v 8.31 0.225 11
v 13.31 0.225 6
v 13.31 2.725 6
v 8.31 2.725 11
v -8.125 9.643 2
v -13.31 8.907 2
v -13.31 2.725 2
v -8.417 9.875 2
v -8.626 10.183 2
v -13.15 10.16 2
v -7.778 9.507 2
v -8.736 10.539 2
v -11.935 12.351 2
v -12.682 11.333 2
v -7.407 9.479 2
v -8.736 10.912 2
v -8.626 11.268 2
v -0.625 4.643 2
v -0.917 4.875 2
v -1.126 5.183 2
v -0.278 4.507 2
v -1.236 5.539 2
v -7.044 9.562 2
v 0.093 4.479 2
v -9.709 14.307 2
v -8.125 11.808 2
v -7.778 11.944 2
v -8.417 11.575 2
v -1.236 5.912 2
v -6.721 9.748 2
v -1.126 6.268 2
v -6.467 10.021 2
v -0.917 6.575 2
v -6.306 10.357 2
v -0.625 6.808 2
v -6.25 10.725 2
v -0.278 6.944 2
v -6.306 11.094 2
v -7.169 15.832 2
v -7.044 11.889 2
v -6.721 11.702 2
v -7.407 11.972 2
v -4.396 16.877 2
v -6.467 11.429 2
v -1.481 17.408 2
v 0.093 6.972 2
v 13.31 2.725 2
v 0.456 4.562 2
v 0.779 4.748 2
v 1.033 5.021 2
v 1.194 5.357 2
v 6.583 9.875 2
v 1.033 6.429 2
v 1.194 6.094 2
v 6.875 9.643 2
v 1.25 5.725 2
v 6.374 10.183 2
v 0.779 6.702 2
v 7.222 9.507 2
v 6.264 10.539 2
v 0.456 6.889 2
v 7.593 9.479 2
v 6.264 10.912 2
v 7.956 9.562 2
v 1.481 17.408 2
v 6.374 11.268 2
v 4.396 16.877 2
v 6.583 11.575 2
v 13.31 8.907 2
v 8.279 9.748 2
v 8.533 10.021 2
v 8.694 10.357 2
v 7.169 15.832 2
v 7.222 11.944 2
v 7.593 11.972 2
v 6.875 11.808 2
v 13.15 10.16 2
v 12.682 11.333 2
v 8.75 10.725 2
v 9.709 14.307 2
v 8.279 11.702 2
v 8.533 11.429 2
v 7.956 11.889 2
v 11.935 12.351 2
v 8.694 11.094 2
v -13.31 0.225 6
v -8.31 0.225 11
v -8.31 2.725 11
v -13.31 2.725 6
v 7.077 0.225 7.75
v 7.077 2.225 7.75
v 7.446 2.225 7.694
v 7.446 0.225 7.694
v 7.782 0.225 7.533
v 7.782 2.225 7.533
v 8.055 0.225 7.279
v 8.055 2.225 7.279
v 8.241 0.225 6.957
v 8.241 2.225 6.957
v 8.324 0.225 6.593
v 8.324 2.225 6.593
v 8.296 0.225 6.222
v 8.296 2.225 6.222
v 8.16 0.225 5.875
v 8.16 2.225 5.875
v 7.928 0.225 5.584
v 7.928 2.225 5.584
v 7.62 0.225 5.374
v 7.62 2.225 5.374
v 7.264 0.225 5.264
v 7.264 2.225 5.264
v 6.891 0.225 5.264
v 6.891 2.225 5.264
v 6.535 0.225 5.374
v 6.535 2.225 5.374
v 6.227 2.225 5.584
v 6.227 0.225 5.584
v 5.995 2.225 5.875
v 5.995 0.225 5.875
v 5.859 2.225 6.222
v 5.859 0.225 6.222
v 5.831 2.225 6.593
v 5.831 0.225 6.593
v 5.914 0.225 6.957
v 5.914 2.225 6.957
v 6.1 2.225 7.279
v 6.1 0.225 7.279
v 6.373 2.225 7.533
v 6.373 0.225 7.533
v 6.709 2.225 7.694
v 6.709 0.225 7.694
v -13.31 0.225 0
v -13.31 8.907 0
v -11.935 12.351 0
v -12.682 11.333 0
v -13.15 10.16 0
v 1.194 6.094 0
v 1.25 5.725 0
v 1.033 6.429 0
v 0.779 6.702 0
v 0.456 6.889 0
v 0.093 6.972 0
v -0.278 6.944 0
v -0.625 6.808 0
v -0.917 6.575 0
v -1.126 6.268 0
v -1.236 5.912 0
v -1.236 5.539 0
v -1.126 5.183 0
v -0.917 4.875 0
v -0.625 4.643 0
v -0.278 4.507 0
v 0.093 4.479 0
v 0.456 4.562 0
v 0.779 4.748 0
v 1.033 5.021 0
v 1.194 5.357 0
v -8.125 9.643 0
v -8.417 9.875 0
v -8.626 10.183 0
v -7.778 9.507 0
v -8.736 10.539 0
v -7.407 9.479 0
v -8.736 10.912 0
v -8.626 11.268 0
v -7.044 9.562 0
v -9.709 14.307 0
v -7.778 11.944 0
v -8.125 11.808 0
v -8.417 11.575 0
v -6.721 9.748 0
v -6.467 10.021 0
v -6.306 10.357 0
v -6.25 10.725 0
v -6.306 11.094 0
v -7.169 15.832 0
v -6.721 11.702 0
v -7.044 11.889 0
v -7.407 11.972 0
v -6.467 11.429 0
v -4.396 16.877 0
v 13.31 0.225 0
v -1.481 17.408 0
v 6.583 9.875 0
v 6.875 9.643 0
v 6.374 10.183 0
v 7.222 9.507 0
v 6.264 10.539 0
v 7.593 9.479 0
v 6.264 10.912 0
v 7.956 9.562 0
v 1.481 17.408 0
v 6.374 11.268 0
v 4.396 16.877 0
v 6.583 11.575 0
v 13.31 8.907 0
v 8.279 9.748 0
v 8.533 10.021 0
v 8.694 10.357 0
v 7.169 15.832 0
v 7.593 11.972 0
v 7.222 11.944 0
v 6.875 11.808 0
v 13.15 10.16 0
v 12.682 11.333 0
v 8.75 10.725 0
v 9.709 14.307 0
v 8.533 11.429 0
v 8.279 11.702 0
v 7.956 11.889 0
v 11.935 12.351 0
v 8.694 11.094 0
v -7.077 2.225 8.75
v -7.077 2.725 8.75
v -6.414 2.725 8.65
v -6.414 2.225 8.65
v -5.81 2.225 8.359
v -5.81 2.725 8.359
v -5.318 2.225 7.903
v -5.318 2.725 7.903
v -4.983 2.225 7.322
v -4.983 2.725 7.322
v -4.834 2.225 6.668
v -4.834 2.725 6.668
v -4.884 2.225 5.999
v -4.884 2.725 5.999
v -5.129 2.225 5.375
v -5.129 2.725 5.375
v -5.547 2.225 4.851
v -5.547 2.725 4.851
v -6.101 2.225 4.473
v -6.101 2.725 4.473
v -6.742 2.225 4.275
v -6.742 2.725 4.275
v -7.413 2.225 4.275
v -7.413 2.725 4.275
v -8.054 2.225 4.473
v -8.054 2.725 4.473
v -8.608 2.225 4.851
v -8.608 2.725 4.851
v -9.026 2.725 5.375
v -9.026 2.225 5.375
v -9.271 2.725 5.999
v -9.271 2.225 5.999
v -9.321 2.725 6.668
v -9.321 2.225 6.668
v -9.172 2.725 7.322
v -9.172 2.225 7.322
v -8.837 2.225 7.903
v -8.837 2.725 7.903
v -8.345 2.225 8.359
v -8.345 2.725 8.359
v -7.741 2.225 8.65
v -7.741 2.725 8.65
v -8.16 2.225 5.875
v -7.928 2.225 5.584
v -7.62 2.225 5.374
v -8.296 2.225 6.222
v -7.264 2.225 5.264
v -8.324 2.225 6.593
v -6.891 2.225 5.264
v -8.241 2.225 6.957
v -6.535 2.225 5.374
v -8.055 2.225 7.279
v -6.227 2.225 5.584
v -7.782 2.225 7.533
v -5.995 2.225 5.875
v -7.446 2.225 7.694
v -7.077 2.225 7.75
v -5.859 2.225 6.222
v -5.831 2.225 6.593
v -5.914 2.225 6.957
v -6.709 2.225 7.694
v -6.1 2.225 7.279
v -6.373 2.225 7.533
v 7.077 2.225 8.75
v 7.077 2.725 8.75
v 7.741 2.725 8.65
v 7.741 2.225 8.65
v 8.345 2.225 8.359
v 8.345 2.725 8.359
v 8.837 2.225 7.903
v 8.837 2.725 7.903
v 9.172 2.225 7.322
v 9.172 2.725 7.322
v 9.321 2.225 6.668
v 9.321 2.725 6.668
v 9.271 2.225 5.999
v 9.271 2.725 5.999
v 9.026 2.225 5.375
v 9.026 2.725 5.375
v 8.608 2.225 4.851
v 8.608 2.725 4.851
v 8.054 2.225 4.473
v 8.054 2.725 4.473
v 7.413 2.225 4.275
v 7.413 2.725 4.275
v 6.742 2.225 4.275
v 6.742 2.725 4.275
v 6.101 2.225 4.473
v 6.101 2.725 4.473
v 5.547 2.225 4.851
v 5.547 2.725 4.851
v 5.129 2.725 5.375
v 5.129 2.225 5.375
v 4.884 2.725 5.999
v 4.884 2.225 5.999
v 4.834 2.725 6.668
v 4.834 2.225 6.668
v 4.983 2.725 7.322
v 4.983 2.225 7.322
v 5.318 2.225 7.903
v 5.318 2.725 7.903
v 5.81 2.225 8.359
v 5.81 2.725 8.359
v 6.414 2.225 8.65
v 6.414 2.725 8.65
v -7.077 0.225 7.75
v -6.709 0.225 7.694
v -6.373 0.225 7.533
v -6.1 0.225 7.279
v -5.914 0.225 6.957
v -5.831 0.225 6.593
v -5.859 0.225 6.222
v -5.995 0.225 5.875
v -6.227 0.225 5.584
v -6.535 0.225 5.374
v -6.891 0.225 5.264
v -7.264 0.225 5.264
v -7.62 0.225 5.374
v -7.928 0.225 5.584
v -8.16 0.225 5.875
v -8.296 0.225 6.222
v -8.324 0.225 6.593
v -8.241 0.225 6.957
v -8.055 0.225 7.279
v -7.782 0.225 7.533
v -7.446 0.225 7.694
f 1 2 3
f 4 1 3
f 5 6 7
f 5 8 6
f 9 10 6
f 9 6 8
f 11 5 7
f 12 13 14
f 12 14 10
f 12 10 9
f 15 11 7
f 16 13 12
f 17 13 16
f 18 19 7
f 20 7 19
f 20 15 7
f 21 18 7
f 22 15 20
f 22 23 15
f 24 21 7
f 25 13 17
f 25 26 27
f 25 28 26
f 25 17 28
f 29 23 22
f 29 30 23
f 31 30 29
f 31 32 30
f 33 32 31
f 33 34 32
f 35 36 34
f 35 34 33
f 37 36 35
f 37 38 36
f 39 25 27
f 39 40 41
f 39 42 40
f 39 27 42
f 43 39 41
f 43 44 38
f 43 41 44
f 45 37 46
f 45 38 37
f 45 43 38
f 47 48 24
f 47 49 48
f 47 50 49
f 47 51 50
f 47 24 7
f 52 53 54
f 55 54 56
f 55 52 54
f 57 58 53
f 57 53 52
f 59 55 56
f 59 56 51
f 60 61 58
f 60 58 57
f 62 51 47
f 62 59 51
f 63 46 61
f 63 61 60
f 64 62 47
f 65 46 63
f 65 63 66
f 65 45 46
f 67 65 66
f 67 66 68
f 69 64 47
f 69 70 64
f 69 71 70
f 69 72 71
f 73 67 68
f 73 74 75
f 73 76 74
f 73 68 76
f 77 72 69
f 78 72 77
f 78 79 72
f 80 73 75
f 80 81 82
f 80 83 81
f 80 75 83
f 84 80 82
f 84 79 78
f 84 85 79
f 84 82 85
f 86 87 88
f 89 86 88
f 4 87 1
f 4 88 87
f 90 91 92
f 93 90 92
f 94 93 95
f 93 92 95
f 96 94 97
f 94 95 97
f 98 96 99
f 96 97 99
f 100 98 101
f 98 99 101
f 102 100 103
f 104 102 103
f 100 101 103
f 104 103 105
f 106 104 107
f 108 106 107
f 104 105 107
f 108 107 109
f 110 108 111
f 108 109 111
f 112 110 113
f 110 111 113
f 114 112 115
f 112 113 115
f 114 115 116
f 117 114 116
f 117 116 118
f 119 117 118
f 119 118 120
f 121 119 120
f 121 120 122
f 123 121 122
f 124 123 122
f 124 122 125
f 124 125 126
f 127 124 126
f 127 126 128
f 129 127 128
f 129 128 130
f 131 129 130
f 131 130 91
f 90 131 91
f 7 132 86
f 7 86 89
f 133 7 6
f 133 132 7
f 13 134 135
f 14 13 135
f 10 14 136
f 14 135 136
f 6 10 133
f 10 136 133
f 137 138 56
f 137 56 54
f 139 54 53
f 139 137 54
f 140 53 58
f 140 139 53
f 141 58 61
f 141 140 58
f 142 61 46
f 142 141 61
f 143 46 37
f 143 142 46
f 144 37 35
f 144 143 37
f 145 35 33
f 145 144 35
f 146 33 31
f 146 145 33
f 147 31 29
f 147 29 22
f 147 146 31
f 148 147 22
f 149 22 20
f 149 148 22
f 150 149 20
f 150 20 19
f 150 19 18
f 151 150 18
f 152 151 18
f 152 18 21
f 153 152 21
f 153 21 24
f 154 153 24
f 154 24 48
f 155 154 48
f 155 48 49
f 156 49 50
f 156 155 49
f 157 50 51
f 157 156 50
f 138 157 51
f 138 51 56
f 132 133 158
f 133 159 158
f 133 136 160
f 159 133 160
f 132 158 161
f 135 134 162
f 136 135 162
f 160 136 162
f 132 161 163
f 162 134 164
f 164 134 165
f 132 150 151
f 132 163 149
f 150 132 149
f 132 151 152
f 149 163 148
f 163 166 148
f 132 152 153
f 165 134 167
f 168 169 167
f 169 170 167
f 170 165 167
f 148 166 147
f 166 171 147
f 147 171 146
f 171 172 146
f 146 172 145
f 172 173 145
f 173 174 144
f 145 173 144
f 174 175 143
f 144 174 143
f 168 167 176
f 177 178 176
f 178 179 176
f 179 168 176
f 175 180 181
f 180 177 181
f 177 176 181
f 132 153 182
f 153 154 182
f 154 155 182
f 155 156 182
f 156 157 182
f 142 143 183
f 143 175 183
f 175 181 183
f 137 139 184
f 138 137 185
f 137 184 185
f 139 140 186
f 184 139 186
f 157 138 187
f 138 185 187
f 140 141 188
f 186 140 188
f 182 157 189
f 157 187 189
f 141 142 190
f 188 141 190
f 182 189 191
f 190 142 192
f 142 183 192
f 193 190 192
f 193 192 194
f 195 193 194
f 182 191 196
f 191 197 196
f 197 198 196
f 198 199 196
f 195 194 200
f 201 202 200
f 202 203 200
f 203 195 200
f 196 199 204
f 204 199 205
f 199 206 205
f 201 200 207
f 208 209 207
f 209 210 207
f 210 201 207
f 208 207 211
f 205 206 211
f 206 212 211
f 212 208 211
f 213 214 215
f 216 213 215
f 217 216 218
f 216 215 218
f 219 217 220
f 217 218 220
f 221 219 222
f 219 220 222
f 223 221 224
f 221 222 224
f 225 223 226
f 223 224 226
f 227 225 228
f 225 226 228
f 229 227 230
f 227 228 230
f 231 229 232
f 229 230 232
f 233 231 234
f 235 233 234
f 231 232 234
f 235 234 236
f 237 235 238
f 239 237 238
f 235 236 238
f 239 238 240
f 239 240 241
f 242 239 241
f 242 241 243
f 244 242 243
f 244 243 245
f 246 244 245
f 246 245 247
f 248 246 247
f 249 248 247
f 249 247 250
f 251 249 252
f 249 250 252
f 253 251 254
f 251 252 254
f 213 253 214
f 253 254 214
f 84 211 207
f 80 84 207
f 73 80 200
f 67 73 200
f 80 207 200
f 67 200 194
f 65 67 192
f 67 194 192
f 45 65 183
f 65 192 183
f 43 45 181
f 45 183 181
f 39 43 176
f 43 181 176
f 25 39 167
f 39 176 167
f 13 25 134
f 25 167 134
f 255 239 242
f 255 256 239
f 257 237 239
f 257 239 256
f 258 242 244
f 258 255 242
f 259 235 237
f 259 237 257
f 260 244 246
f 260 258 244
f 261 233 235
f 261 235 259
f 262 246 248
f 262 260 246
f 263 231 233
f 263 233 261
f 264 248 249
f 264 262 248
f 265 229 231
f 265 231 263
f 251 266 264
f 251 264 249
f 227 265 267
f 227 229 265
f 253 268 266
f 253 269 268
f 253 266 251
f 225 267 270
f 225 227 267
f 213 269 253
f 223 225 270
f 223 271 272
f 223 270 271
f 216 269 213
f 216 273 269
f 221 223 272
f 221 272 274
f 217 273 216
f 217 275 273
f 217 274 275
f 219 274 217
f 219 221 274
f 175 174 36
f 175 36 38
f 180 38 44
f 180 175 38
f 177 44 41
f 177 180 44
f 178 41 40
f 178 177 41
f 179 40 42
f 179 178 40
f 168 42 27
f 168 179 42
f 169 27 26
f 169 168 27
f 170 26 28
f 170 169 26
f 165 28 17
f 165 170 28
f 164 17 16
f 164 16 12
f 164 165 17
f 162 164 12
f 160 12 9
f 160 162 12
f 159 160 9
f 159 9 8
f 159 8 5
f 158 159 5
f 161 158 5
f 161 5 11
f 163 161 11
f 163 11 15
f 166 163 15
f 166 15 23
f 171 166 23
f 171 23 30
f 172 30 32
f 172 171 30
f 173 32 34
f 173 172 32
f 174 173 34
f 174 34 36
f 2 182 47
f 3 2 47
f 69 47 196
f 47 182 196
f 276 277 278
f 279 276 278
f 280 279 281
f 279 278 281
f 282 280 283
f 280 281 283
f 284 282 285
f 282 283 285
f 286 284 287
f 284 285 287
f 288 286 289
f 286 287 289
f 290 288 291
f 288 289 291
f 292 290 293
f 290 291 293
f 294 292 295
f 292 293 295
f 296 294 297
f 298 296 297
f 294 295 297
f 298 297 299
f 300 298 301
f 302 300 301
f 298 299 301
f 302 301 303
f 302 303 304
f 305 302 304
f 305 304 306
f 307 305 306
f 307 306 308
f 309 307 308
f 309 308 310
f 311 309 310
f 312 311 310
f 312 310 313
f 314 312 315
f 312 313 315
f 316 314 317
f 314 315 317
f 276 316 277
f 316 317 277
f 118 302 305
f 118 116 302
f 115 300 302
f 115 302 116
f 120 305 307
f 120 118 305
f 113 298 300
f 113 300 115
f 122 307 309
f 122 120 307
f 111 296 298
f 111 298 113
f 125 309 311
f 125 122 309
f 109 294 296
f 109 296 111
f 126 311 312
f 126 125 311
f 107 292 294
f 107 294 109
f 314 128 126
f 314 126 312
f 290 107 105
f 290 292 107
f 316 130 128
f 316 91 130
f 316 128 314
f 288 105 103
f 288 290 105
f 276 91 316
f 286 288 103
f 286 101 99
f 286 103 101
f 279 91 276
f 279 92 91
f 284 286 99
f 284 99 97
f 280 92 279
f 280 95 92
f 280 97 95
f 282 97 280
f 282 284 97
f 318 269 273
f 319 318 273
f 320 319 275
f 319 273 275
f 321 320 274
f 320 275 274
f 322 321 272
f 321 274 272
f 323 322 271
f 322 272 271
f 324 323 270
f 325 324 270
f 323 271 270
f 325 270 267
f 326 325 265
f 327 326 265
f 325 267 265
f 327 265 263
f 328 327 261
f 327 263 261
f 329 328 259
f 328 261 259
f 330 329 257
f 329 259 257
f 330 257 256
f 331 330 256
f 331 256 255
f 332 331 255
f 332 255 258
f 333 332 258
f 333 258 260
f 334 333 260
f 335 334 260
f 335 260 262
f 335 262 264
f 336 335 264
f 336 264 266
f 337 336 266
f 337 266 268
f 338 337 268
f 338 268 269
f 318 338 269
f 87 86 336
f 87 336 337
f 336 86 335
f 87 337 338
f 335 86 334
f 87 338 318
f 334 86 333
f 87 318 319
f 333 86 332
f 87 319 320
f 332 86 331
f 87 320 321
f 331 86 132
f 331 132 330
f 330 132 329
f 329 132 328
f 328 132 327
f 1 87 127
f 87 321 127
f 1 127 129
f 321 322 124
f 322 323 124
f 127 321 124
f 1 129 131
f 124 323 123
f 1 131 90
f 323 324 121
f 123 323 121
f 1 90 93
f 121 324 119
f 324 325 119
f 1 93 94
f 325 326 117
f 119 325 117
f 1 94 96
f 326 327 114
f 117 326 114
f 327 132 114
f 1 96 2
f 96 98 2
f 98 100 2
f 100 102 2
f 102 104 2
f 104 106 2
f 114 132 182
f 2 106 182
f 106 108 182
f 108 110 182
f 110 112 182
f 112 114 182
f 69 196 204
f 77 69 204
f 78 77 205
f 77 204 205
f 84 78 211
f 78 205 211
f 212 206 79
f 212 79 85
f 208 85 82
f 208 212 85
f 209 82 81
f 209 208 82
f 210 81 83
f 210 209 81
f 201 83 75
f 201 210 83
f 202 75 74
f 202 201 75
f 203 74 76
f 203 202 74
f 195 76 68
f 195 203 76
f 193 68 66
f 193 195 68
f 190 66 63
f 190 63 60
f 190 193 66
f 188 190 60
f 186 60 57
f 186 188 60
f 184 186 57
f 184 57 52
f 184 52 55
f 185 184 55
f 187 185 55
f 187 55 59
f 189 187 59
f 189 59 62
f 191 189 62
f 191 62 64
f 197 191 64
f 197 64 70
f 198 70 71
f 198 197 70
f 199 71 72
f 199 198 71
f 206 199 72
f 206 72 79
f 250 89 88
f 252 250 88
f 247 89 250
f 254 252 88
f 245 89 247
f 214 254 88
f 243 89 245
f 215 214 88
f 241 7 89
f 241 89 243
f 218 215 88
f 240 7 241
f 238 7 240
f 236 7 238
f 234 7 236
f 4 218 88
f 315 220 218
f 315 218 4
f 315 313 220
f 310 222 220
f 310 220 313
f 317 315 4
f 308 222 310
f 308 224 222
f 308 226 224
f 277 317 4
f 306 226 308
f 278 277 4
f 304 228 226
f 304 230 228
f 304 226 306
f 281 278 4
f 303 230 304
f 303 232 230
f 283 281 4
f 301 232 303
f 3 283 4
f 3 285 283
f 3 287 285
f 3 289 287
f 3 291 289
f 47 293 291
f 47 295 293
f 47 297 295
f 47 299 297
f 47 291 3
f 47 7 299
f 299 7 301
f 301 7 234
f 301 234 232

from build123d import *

# Parameters (mm, degrees)
SKETCH1_R           = 1.25
BOSS_EXTRUDE1_DEPTH = 2
SKETCH2_W           = 26.619471542
SKETCH2_H           = 2.5
BOSS_EXTRUDE2_DEPTH = 9
SKETCH3_R           = 1.25
CUT_EXTRUDE1_DEPTH  = 9
SKETCH4_R           = 2.25
CUT_EXTRUDE2_DEPTH  = 0.5
CHAMFER1_SIZE       = 5


with BuildPart() as part:
    # Sketch1 → Boss-Extrude1 (new body)
    with BuildSketch(Plane.XY):
        with BuildLine():
            Line((-13.309735771, 0.225207445), (13.309735771, 0.225207445))
            Line((13.309735771, 0.225207445), (13.309735771, 8.907396156))
            ThreePointArc((13.309735771, 8.907396156), (12.953344247, 10.761284051), (11.934975641, 12.350887972))
            ThreePointArc((11.934975641, 12.350887972), (0, 17.475207445), (-11.934975641, 12.350887972))
            ThreePointArc((-11.934975641, 12.350887972), (-12.953344247, 10.761284051), (-13.309735771, 8.907396156))
            Line((-13.309735771, 8.907396156), (-13.309735771, 0.225207445))
        make_face()
        with Locations((7.499735771, 10.725207445)):
            Circle(SKETCH1_R, mode=Mode.SUBTRACT)
        with Locations((-7.500264229, 10.725207445)):
            Circle(SKETCH1_R, mode=Mode.SUBTRACT)
        with Locations((-0.000264229, 5.725207445)):
            Circle(SKETCH1_R, mode=Mode.SUBTRACT)
    extrude(amount=BOSS_EXTRUDE1_DEPTH)

    # Sketch2 → Boss-Extrude2 (add)
    with BuildSketch(Plane.XY.offset(2)):
        with Locations((0, 1.475207445)):
            Rectangle(SKETCH2_W, SKETCH2_H)
    extrude(amount=BOSS_EXTRUDE2_DEPTH)

    # Sketch3 → Cut-Extrude1 (cut)
    with BuildSketch(Plane(origin=(0, 2.725207445, 0), x_dir=(1, 0, 0), z_dir=(0, 1, 0))):
        with Locations(Location((-7.077404832, -6.5, 0), (0, 0, 270))):  # turned: the seam where the file's is
            Circle(SKETCH3_R)
        with Locations(Location((7.077404832, -6.5, 0), (0, 0, 270))):  # turned: the seam where the file's is
            Circle(SKETCH3_R)
    extrude(amount=-CUT_EXTRUDE1_DEPTH, mode=Mode.SUBTRACT)

    # Sketch4 → Cut-Extrude2 (cut)
    with BuildSketch(Plane(origin=(0, 2.725207445, 0), x_dir=(1, 0, 0), z_dir=(0, 1, 0))):
        with Locations(Location((-7.077404832, -6.5, 0), (0, 0, 270))):  # turned: the seam where the file's is
            Circle(SKETCH4_R)
        with Locations(Location((7.077404832, -6.5, 0), (0, 0, 270))):  # turned: the seam where the file's is
            Circle(SKETCH4_R)
    extrude(amount=-CUT_EXTRUDE2_DEPTH, mode=Mode.SUBTRACT)

    # Chamfer1
    chamfer1_edges = [part.edges().sort_by_distance(p)[0] for p in [
        (13.309735771, 1.475207445, 11),
        (-13.309735771, 1.475207445, 11),
    ]]
    chamfer(chamfer1_edges, length=CHAMFER1_SIZE)


solid = part.part
